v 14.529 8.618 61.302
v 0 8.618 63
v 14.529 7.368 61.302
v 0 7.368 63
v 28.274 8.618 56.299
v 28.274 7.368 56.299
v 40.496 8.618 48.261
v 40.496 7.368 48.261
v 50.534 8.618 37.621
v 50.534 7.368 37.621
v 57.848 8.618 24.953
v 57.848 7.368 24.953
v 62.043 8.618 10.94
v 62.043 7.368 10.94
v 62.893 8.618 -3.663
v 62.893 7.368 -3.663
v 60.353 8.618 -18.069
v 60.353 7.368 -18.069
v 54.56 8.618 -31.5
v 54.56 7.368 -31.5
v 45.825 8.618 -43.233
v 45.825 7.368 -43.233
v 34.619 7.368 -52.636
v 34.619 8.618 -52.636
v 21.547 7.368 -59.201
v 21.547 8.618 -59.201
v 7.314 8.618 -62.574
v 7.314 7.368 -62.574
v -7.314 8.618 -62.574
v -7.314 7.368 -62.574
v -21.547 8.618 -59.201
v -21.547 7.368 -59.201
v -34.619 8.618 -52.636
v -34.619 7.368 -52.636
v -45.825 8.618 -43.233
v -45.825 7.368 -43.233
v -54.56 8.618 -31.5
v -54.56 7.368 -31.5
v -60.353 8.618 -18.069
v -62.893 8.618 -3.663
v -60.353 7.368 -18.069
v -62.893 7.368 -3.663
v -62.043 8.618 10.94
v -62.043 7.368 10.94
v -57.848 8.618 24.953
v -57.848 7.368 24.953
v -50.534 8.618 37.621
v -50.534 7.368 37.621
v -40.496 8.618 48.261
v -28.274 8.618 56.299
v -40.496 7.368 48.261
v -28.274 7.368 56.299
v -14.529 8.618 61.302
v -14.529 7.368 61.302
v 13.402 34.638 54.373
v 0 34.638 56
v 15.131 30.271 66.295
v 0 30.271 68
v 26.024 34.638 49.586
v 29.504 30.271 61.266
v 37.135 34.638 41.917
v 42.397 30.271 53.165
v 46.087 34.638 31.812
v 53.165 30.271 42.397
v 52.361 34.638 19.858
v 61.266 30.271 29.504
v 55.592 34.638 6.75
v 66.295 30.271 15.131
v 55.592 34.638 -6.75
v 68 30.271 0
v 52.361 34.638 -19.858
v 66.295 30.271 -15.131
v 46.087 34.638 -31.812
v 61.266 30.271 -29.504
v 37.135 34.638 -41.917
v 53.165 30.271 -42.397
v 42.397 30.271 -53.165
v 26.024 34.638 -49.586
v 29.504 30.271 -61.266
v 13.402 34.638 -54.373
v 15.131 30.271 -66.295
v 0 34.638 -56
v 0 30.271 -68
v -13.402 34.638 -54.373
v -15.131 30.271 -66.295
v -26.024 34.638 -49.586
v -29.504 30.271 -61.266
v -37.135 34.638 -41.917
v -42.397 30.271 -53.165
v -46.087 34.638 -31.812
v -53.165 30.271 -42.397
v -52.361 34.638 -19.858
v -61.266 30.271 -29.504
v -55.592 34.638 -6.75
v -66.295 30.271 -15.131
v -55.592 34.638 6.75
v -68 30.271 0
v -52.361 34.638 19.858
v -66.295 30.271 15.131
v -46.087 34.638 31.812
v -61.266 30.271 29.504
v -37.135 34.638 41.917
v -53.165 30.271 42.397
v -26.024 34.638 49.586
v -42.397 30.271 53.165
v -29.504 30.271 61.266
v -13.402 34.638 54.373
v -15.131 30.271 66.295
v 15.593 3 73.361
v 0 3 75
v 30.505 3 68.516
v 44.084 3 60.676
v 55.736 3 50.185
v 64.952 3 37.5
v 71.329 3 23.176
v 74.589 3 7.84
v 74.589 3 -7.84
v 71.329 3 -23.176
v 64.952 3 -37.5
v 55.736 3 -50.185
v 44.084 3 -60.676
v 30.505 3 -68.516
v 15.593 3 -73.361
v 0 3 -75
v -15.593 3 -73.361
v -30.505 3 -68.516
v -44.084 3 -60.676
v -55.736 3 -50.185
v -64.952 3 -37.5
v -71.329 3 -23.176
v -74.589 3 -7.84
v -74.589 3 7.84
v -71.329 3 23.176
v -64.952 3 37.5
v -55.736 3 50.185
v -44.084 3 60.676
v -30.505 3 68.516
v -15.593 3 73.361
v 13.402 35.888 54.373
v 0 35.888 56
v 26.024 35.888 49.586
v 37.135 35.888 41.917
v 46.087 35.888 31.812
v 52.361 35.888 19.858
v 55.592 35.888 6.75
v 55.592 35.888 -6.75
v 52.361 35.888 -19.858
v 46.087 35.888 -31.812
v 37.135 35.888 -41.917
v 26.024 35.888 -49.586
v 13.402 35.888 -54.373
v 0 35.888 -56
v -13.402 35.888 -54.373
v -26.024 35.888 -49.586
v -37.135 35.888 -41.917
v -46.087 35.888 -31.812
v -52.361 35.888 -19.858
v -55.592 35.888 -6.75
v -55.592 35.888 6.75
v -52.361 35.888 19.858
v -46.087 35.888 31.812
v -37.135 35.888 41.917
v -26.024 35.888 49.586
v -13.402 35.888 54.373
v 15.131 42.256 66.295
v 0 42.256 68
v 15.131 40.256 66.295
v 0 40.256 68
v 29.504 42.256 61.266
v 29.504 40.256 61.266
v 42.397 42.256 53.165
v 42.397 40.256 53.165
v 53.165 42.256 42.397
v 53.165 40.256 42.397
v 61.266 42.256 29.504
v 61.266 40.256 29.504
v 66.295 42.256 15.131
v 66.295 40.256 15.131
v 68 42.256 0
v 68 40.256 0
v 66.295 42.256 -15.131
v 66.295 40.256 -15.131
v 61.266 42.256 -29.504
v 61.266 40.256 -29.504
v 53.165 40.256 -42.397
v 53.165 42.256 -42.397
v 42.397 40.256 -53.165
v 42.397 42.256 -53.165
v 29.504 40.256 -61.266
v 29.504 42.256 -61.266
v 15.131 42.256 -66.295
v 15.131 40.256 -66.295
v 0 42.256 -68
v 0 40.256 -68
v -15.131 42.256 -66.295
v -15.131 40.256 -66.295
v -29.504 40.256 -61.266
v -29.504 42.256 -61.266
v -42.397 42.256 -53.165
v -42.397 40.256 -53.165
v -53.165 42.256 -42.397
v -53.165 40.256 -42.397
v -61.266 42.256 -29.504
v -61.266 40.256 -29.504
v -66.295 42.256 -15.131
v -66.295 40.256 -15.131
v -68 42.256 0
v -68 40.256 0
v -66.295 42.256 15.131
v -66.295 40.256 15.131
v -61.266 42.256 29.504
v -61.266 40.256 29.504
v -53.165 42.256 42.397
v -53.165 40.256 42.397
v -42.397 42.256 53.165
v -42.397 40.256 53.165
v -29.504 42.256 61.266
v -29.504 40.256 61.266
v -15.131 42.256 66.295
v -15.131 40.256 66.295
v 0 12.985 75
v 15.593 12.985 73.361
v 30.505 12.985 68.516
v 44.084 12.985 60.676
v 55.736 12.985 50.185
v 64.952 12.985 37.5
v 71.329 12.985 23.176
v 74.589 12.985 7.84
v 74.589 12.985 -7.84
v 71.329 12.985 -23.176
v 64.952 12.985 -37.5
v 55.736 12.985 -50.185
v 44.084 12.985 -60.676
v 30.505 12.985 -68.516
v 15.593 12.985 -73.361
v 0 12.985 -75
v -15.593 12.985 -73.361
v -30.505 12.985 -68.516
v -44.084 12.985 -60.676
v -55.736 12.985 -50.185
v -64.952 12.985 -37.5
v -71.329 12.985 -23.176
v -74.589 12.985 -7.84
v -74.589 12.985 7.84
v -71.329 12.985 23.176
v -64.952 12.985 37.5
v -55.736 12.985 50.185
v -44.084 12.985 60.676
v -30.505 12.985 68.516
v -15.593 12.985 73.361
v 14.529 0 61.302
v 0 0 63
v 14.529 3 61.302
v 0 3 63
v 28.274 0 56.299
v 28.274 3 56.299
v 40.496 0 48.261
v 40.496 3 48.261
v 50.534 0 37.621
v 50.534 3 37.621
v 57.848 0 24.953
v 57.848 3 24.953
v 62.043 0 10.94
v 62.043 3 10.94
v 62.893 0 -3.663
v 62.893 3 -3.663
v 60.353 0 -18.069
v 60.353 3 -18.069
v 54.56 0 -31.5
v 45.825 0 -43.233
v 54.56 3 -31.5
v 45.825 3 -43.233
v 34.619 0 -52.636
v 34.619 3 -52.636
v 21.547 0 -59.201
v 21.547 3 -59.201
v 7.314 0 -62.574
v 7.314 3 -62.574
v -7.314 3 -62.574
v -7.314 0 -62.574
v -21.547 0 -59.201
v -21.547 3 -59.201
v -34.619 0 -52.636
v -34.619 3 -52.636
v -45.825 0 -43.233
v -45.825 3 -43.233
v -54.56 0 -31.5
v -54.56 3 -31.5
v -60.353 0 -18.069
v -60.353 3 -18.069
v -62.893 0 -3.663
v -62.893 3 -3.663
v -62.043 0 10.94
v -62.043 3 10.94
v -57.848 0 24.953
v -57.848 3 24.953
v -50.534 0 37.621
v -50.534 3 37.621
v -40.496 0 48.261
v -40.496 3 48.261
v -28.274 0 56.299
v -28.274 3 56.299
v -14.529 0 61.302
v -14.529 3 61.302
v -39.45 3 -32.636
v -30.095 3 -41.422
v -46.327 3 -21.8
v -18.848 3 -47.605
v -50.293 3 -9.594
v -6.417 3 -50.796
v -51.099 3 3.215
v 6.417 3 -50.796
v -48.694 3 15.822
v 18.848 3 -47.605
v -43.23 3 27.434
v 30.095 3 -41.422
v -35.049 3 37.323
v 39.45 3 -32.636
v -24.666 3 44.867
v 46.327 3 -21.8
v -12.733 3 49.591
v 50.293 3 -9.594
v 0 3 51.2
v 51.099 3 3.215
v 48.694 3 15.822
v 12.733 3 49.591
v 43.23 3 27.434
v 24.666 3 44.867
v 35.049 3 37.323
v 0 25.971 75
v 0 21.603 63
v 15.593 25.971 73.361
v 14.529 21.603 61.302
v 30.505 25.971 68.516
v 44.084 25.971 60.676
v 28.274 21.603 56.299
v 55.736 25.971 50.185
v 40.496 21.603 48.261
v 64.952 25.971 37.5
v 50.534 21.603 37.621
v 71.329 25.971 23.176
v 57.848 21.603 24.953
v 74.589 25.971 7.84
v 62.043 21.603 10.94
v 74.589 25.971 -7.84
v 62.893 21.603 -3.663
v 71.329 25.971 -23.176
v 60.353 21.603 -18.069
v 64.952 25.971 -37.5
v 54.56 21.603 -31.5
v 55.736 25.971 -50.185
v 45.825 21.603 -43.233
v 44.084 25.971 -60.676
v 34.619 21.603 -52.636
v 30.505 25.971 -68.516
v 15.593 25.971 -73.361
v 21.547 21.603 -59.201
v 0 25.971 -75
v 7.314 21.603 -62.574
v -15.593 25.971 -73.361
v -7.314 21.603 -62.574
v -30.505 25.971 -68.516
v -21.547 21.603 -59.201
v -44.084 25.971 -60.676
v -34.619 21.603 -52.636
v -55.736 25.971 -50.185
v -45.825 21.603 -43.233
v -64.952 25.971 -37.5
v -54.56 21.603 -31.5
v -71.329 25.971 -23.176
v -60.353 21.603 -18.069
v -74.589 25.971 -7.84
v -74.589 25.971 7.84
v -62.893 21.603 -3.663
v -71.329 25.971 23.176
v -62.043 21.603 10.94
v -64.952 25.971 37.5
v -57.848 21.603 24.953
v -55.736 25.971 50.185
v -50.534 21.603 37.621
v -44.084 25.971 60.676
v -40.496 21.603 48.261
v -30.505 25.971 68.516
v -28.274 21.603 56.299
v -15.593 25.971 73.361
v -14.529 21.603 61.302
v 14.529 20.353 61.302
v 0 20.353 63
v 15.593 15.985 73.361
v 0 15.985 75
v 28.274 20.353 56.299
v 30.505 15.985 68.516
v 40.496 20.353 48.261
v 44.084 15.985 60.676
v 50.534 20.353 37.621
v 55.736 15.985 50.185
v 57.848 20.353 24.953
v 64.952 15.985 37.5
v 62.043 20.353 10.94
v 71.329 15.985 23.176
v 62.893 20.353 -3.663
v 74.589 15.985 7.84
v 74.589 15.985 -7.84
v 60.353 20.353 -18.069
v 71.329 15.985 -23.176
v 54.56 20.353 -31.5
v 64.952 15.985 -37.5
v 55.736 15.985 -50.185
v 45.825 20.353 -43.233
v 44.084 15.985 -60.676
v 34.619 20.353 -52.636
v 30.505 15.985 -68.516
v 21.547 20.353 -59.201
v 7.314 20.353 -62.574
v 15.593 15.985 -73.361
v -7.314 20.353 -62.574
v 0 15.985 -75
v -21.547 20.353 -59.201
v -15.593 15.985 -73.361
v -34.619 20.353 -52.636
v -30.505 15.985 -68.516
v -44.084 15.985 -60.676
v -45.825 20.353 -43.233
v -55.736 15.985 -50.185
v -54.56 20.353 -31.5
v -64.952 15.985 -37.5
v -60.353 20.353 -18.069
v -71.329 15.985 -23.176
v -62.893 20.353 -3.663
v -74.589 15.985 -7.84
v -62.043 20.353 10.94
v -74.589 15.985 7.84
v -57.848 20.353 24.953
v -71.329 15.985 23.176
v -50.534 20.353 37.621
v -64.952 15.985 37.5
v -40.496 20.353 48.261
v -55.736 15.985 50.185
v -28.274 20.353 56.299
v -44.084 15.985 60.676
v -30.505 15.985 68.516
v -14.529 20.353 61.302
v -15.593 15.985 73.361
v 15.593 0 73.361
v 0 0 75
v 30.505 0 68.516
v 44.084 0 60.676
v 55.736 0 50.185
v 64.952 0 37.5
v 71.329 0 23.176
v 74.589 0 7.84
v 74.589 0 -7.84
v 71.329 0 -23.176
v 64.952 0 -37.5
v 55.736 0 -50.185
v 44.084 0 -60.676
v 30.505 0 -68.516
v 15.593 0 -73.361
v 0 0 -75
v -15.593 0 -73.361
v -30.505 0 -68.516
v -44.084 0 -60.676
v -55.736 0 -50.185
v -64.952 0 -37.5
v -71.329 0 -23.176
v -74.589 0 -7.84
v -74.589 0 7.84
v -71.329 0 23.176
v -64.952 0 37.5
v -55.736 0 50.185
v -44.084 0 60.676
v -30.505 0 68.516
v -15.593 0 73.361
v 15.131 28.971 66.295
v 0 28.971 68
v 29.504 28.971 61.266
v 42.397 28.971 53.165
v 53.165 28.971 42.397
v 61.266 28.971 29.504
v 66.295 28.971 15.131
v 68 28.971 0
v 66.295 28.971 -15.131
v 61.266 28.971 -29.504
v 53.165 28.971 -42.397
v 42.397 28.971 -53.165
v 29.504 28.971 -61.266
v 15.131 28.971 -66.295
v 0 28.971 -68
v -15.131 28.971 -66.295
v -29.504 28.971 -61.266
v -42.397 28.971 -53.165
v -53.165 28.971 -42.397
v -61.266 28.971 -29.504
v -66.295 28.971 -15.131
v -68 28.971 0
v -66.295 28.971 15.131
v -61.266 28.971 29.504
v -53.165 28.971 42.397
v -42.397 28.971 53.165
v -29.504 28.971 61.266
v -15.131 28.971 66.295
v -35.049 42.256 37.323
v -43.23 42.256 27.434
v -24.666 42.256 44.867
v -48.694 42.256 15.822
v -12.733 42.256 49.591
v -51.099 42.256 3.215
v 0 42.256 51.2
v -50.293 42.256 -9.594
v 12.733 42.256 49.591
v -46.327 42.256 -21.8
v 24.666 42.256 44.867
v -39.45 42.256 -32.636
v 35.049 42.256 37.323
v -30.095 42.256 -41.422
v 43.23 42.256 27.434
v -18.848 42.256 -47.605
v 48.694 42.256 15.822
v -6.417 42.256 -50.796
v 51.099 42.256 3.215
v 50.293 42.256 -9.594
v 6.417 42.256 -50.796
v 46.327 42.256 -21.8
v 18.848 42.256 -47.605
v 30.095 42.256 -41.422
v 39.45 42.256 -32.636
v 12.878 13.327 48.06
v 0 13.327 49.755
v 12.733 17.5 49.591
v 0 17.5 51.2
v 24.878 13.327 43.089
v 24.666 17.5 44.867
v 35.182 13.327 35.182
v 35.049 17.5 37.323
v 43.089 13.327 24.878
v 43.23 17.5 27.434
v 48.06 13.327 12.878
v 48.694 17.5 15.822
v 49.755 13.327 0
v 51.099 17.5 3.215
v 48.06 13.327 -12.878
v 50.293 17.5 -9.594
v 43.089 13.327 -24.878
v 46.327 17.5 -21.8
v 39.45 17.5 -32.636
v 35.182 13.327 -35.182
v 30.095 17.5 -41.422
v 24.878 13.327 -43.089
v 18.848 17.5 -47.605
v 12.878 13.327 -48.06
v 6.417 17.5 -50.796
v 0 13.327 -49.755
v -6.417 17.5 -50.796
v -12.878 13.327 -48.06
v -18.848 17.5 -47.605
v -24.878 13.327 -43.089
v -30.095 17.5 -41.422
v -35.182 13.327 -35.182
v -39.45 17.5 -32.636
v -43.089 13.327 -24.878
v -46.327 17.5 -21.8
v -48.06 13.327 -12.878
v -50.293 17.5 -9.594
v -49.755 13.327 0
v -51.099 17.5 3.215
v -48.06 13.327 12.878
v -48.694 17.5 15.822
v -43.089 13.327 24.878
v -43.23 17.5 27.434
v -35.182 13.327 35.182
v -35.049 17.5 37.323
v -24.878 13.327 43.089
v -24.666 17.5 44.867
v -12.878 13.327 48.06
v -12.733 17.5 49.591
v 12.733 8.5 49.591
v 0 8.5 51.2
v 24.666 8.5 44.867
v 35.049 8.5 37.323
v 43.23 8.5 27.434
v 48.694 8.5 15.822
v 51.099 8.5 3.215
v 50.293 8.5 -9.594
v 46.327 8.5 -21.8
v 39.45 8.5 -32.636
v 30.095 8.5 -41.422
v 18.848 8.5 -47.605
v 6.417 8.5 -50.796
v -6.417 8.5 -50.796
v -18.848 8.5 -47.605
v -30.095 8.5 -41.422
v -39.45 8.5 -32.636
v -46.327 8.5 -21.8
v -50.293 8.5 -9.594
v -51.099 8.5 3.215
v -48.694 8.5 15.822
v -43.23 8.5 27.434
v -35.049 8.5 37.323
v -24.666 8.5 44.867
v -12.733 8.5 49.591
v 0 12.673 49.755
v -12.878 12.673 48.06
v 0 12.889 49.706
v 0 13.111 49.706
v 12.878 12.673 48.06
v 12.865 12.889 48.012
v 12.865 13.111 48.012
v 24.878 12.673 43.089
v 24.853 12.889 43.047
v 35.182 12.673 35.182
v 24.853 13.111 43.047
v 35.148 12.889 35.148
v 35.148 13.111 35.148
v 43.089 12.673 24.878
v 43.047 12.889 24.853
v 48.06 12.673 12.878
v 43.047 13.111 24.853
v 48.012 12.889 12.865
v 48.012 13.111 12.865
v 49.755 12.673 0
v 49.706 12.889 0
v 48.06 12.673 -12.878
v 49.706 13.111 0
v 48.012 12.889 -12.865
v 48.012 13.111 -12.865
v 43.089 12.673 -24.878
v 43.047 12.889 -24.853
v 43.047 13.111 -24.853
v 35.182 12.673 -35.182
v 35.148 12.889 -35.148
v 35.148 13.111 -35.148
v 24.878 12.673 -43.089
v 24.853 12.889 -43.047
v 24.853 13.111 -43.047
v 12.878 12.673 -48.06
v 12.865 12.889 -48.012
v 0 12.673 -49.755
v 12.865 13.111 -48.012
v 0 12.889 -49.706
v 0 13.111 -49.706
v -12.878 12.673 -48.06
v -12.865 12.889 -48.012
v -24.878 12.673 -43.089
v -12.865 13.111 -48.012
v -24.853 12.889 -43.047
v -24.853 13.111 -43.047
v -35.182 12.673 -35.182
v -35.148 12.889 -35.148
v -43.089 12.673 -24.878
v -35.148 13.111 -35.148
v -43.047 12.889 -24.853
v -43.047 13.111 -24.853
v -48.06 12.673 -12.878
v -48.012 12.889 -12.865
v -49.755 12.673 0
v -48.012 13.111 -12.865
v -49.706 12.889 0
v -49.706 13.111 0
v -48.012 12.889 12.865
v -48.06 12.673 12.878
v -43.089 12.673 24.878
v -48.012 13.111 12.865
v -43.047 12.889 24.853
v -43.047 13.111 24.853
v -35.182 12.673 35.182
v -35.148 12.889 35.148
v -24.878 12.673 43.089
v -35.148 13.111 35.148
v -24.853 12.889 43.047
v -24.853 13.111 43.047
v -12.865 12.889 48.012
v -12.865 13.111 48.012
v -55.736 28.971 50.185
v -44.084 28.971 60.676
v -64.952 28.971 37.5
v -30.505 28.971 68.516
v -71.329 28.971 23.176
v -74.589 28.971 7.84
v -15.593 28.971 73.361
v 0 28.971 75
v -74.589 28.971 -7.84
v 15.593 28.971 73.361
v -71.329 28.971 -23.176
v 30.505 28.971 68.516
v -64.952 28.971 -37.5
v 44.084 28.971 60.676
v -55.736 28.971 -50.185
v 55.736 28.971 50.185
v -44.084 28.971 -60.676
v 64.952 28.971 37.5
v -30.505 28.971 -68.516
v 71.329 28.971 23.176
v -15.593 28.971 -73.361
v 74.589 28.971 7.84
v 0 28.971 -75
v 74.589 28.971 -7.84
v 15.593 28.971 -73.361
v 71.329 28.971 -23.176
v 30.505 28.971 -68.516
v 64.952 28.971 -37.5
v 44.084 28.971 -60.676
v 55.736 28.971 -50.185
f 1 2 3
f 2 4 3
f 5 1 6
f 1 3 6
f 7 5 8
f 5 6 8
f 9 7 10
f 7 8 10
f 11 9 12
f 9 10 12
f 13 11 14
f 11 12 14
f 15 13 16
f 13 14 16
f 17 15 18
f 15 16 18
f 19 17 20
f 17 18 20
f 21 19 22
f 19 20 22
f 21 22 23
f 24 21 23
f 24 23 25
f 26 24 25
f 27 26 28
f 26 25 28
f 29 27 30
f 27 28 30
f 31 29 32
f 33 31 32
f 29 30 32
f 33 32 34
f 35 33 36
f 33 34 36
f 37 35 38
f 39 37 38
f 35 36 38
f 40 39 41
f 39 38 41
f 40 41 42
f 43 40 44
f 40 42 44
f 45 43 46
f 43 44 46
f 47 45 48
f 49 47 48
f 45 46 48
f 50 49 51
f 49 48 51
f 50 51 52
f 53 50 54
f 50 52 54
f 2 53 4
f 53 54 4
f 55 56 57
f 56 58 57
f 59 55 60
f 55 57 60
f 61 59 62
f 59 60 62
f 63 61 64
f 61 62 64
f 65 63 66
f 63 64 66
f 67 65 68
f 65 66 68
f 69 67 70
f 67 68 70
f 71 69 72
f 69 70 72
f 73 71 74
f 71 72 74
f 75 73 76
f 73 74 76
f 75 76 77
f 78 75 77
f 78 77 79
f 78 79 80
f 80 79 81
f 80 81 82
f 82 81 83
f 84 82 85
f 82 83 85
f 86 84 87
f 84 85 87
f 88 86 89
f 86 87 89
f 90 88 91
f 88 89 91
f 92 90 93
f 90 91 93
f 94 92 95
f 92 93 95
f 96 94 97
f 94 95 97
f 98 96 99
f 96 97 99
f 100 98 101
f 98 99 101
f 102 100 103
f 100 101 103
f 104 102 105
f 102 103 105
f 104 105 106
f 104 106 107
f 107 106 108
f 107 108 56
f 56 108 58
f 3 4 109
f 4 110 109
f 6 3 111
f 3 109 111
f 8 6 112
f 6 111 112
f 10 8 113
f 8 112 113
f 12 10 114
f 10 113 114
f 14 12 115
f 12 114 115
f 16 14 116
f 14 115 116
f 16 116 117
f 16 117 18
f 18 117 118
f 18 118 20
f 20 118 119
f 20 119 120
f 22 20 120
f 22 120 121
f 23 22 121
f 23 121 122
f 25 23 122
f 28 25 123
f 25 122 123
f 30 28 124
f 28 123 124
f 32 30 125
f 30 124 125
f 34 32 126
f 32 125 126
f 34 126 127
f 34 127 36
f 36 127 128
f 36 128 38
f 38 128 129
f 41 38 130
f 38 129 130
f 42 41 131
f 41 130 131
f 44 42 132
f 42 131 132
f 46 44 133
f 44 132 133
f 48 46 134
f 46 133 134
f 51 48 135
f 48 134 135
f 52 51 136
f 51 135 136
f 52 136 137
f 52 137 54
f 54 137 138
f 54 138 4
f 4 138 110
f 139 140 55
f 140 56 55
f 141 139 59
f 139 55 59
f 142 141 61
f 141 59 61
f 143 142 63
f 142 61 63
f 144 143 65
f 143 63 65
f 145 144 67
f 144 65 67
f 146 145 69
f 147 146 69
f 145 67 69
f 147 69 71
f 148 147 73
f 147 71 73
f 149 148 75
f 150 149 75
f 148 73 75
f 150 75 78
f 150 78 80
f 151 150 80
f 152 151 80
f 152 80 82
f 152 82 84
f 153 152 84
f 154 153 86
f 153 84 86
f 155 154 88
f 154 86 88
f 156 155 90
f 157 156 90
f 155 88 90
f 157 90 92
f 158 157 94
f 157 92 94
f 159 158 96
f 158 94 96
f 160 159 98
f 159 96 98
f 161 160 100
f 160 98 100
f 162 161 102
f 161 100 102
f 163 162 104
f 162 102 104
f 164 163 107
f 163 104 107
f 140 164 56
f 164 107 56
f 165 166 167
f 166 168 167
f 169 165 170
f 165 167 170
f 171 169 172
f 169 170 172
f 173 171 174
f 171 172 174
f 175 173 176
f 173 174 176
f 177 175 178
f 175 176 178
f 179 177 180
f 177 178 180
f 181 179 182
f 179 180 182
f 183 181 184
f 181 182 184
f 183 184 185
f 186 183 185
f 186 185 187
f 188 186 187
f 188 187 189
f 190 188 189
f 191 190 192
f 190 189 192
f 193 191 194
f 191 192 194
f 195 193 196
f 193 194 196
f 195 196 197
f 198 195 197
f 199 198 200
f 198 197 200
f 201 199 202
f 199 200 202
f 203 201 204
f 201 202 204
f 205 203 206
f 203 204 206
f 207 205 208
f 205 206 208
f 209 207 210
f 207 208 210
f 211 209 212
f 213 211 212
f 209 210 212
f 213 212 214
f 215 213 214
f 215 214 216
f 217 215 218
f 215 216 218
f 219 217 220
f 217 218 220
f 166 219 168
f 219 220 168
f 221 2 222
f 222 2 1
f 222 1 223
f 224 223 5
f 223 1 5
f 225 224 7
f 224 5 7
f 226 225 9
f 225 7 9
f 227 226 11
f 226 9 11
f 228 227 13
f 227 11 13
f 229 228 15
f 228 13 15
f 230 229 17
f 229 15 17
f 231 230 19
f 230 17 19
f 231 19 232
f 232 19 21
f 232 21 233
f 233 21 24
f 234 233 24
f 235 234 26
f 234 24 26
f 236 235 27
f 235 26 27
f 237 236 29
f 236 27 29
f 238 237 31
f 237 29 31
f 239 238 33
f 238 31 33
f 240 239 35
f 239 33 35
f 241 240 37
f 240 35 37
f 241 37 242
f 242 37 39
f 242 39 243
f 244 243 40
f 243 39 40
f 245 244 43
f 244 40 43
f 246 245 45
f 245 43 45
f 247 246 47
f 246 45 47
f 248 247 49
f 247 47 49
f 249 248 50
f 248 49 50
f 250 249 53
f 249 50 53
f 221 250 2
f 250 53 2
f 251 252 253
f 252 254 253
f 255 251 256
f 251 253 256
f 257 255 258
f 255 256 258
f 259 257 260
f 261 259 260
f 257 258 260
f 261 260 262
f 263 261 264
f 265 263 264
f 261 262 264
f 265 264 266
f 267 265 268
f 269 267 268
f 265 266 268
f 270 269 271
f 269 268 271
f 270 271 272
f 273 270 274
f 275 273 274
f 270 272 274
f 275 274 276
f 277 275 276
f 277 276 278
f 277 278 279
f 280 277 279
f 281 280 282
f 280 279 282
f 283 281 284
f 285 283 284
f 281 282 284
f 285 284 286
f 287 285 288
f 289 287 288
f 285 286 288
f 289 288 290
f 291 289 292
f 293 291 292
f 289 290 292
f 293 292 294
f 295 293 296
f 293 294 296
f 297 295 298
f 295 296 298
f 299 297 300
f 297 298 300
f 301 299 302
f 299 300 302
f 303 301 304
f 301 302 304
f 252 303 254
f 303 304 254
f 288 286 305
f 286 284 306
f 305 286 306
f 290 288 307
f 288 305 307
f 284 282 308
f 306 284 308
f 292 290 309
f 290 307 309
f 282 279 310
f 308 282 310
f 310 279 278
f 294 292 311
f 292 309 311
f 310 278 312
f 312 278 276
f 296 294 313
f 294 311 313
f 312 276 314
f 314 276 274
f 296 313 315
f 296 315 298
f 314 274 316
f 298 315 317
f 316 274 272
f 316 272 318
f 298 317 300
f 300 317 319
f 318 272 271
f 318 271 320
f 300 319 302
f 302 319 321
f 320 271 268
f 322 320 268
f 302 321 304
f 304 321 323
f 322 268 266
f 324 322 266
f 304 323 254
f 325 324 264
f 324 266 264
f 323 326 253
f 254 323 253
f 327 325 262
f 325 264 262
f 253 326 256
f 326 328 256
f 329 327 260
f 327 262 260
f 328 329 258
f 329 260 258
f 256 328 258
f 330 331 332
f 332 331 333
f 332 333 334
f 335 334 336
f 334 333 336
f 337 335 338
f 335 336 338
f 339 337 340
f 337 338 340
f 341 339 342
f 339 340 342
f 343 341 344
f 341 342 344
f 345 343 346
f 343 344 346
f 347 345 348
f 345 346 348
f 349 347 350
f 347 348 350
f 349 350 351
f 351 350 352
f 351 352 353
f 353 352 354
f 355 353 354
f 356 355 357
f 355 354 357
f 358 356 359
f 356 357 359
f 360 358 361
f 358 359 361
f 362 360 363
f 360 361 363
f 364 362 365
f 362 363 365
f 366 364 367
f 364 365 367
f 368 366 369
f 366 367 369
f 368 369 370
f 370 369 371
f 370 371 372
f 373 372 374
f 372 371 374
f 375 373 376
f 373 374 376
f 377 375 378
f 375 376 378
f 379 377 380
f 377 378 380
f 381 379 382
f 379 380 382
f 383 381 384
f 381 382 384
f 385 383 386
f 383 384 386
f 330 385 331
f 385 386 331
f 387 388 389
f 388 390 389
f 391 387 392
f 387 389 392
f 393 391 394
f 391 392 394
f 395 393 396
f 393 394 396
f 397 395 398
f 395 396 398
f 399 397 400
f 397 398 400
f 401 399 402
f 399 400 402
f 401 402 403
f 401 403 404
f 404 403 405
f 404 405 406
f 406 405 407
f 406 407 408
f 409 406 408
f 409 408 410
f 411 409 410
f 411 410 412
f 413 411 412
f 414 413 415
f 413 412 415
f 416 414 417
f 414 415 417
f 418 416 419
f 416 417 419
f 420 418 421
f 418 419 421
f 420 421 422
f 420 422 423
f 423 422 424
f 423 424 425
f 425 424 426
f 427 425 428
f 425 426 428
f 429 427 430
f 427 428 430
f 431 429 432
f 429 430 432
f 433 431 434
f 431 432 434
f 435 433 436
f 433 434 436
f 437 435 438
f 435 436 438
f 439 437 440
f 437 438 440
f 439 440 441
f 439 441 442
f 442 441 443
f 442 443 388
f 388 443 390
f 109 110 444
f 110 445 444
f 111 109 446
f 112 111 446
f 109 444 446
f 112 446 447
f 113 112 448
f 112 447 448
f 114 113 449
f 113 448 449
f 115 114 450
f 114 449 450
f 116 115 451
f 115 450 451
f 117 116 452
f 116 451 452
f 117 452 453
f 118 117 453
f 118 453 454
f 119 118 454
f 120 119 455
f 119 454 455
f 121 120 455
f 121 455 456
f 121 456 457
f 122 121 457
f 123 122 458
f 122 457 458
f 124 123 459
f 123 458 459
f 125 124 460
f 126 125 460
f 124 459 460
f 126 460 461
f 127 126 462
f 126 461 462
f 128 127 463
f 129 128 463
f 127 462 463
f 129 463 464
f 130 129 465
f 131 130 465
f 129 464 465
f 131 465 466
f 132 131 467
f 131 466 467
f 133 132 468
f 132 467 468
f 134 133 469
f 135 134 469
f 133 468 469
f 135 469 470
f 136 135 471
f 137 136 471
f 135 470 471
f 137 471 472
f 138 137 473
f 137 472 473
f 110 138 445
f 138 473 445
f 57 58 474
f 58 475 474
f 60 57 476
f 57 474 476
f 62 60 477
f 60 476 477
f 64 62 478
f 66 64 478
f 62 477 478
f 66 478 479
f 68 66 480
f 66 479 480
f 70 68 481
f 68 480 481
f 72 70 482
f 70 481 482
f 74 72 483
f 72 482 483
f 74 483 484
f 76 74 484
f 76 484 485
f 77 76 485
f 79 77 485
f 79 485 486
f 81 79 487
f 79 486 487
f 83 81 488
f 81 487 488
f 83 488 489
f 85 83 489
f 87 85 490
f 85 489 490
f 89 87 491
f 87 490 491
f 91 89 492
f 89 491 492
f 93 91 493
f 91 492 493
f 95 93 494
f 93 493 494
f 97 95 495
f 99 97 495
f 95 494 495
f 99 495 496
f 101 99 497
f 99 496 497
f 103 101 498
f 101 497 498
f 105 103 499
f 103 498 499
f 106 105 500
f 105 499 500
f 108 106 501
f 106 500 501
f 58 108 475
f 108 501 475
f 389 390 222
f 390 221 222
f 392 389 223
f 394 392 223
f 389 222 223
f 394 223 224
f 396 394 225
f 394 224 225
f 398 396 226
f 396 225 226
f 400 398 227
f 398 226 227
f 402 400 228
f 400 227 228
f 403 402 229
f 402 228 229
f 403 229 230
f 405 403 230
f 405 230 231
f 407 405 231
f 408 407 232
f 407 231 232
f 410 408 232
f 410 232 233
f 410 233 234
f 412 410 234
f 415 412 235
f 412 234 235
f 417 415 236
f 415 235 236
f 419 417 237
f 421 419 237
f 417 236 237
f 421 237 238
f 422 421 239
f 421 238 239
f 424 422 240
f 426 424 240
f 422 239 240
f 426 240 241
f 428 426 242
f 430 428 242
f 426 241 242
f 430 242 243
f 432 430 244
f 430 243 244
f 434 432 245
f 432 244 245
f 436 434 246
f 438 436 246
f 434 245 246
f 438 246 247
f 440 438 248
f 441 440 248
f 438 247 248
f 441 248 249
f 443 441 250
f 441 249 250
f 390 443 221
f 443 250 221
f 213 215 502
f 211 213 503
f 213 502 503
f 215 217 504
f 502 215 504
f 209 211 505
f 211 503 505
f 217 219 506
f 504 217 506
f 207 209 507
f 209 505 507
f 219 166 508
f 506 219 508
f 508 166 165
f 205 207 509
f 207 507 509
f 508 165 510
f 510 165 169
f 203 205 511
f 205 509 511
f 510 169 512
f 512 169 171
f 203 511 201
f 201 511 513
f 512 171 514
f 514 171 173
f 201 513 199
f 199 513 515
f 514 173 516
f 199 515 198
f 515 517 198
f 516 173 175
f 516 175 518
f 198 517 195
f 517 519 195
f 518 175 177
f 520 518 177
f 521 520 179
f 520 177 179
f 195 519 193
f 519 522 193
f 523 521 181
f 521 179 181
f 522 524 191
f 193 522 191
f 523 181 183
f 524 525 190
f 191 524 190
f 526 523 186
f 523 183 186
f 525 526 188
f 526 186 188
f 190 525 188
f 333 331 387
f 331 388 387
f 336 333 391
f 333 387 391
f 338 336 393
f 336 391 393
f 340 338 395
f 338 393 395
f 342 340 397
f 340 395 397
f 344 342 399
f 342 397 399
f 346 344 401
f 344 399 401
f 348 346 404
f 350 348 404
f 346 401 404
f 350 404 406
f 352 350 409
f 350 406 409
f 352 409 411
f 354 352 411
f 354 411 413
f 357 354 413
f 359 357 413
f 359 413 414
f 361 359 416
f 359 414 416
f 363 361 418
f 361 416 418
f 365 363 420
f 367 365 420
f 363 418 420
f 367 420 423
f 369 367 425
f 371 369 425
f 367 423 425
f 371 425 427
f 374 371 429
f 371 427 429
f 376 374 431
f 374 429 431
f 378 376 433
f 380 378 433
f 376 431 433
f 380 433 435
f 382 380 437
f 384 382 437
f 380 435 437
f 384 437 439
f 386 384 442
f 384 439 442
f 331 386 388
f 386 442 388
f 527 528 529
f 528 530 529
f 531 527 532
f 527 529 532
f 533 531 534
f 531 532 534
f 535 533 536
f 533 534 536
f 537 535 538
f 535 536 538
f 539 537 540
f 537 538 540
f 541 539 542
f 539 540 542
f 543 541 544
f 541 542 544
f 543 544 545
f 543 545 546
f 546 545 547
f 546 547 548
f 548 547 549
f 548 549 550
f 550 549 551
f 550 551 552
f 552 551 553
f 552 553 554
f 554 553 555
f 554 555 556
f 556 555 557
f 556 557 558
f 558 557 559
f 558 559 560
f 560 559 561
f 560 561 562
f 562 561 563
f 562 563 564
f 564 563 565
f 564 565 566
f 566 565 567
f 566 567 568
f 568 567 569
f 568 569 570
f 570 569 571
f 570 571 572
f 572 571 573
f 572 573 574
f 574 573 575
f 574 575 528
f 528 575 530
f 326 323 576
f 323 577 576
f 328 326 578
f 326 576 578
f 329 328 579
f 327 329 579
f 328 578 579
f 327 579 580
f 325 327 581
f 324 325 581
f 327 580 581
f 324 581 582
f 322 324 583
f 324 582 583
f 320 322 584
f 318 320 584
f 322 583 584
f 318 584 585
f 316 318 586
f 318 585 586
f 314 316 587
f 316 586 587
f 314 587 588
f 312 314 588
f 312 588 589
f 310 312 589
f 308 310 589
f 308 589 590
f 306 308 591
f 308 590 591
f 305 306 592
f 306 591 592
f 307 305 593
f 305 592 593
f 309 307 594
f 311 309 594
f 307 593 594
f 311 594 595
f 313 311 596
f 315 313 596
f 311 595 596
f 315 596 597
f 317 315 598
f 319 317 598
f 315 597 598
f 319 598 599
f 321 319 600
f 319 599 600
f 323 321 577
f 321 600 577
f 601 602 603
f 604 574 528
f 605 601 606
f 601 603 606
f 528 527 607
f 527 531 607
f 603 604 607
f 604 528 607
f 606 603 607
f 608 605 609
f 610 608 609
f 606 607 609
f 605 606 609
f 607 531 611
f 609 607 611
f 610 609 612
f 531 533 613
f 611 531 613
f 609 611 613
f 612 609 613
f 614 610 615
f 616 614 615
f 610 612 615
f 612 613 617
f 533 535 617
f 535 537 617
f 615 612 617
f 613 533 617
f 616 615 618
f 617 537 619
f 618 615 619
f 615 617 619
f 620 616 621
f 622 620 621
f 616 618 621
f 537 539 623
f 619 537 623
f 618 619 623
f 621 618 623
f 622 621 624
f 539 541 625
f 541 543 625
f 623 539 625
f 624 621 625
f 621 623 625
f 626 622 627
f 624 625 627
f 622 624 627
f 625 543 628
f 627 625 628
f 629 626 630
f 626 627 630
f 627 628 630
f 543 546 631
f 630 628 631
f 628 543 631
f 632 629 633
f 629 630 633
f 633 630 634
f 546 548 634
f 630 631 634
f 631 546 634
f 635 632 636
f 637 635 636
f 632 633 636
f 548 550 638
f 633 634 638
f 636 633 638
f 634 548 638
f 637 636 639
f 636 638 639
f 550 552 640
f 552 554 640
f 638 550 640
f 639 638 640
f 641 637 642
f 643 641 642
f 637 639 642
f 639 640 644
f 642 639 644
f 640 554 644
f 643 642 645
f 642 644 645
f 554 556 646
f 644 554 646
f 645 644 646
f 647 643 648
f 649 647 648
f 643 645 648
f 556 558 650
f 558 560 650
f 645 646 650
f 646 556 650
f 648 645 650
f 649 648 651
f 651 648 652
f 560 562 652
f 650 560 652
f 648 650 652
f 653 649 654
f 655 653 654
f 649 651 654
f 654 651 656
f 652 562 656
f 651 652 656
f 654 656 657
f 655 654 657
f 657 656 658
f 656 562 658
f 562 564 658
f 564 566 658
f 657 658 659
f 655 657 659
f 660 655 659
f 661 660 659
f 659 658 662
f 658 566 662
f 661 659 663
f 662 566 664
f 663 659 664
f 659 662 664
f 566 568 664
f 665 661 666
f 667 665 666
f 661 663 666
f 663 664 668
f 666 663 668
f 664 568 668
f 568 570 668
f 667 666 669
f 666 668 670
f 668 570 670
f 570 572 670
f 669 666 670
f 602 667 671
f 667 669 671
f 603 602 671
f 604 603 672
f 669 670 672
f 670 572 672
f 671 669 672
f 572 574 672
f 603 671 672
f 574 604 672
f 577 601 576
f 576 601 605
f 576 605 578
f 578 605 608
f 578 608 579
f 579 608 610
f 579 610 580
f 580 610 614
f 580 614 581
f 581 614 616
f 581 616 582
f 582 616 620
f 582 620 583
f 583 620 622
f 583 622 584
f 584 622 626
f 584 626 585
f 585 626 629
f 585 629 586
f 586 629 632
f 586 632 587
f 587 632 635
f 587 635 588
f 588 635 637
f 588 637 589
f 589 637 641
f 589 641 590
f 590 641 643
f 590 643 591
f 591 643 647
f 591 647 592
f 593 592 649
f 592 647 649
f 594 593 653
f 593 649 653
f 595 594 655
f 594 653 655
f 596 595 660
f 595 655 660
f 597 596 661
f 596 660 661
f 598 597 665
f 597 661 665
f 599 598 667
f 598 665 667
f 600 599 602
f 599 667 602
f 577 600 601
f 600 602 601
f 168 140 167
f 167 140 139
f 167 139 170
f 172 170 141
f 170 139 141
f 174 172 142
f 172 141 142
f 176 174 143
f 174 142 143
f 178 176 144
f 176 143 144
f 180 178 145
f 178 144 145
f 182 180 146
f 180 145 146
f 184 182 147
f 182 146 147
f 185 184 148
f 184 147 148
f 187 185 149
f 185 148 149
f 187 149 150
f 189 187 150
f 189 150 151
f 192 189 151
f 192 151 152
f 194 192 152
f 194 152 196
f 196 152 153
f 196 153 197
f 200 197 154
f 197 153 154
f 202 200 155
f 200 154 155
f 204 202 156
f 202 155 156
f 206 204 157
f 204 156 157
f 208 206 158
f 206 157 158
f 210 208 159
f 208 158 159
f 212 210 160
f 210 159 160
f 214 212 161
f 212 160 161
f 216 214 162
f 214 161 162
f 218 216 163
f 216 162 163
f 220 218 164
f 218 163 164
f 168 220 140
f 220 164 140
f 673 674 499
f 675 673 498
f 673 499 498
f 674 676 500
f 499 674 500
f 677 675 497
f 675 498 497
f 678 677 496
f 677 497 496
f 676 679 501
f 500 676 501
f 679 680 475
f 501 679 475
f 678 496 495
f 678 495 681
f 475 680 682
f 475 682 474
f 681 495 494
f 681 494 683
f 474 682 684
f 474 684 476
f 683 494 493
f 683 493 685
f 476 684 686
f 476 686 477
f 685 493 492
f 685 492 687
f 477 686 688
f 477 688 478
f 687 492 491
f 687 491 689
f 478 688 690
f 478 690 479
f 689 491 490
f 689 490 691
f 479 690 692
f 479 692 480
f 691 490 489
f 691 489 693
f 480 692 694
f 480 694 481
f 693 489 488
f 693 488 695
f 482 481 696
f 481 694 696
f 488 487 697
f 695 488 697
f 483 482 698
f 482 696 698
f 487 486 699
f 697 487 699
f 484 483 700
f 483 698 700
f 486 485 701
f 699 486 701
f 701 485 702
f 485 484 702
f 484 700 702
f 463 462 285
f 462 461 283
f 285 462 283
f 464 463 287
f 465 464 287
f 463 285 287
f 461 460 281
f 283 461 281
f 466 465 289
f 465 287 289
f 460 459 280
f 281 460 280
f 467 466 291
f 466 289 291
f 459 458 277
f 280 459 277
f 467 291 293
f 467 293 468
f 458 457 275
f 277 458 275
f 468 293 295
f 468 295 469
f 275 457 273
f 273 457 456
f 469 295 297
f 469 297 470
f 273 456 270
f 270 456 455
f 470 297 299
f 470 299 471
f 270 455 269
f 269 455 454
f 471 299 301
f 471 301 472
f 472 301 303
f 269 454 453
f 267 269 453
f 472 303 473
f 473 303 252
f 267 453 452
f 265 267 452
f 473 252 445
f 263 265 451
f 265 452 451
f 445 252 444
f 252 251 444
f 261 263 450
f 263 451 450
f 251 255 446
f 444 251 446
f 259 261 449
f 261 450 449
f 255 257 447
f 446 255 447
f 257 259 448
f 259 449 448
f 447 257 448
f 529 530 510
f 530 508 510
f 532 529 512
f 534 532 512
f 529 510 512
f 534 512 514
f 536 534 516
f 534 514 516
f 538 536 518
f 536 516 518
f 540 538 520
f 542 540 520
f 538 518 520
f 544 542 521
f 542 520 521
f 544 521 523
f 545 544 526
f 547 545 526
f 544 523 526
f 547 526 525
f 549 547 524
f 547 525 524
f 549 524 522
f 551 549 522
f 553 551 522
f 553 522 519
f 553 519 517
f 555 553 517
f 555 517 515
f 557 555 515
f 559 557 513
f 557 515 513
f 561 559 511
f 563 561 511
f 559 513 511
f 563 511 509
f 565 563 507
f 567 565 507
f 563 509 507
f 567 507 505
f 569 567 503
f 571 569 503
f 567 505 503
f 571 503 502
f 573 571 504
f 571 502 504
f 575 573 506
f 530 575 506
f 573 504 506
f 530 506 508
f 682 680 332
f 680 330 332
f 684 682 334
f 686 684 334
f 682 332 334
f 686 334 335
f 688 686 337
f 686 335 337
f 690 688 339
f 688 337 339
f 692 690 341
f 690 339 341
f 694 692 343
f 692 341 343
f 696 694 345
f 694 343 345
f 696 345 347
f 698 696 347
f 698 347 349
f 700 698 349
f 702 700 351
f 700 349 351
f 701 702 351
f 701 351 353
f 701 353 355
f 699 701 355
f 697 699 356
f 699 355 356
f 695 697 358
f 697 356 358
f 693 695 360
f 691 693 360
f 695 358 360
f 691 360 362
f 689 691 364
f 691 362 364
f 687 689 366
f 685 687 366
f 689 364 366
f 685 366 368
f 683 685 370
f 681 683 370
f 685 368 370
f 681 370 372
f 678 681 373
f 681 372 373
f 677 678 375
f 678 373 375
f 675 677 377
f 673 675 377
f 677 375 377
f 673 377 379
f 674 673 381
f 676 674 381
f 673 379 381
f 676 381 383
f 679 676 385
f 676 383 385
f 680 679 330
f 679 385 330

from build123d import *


with BuildPart() as f1:
    # F0 (on Right) → F1 (revolve)
    with BuildSketch(Plane.YZ):
        with BuildLine():
            Line((3, 63), (3, 51.2))
            Line((3, 51.2), (8.5, 51.2))
            Line((8.5, 51.2), (12.672783, 49.755051))
            ThreePointArc((12.672783, 49.755051), (13, 49.7), (13.327217, 49.755051))
            Line((13.327217, 49.755051), (17.5, 51.2))
            Line((17.5, 51.2), (42.255857, 51.2))
            Line((42.255857, 51.2), (42.255857, 68))
            Line((42.255857, 68), (40.255857, 68))
            Line((40.255857, 68), (35.888214, 56))
            Line((35.888214, 56), (34.638214, 56))
            Line((34.638214, 56), (30.270571, 68))
            Line((30.270571, 68), (28.970571, 68))
            Line((28.970571, 68), (28.970571, 75))
            Line((28.970571, 75), (25.970571, 75))
            Line((25.970571, 75), (21.602928, 63))
            Line((21.602928, 63), (20.352928, 63))
            Line((20.352928, 63), (15.985286, 75))
            Line((15.985286, 75), (12.985286, 75))
            Line((12.985286, 75), (8.617643, 63))
            Line((8.617643, 63), (7.367643, 63))
            Line((7.367643, 63), (3, 75))
            Line((3, 75), (0, 75))
            Line((0, 75), (0, 63))
            Line((0, 63), (3, 63))
        make_face()
    revolve(axis=Axis((0, 21.127928, 0), (0, 1, 0)))


solid = f1.part
